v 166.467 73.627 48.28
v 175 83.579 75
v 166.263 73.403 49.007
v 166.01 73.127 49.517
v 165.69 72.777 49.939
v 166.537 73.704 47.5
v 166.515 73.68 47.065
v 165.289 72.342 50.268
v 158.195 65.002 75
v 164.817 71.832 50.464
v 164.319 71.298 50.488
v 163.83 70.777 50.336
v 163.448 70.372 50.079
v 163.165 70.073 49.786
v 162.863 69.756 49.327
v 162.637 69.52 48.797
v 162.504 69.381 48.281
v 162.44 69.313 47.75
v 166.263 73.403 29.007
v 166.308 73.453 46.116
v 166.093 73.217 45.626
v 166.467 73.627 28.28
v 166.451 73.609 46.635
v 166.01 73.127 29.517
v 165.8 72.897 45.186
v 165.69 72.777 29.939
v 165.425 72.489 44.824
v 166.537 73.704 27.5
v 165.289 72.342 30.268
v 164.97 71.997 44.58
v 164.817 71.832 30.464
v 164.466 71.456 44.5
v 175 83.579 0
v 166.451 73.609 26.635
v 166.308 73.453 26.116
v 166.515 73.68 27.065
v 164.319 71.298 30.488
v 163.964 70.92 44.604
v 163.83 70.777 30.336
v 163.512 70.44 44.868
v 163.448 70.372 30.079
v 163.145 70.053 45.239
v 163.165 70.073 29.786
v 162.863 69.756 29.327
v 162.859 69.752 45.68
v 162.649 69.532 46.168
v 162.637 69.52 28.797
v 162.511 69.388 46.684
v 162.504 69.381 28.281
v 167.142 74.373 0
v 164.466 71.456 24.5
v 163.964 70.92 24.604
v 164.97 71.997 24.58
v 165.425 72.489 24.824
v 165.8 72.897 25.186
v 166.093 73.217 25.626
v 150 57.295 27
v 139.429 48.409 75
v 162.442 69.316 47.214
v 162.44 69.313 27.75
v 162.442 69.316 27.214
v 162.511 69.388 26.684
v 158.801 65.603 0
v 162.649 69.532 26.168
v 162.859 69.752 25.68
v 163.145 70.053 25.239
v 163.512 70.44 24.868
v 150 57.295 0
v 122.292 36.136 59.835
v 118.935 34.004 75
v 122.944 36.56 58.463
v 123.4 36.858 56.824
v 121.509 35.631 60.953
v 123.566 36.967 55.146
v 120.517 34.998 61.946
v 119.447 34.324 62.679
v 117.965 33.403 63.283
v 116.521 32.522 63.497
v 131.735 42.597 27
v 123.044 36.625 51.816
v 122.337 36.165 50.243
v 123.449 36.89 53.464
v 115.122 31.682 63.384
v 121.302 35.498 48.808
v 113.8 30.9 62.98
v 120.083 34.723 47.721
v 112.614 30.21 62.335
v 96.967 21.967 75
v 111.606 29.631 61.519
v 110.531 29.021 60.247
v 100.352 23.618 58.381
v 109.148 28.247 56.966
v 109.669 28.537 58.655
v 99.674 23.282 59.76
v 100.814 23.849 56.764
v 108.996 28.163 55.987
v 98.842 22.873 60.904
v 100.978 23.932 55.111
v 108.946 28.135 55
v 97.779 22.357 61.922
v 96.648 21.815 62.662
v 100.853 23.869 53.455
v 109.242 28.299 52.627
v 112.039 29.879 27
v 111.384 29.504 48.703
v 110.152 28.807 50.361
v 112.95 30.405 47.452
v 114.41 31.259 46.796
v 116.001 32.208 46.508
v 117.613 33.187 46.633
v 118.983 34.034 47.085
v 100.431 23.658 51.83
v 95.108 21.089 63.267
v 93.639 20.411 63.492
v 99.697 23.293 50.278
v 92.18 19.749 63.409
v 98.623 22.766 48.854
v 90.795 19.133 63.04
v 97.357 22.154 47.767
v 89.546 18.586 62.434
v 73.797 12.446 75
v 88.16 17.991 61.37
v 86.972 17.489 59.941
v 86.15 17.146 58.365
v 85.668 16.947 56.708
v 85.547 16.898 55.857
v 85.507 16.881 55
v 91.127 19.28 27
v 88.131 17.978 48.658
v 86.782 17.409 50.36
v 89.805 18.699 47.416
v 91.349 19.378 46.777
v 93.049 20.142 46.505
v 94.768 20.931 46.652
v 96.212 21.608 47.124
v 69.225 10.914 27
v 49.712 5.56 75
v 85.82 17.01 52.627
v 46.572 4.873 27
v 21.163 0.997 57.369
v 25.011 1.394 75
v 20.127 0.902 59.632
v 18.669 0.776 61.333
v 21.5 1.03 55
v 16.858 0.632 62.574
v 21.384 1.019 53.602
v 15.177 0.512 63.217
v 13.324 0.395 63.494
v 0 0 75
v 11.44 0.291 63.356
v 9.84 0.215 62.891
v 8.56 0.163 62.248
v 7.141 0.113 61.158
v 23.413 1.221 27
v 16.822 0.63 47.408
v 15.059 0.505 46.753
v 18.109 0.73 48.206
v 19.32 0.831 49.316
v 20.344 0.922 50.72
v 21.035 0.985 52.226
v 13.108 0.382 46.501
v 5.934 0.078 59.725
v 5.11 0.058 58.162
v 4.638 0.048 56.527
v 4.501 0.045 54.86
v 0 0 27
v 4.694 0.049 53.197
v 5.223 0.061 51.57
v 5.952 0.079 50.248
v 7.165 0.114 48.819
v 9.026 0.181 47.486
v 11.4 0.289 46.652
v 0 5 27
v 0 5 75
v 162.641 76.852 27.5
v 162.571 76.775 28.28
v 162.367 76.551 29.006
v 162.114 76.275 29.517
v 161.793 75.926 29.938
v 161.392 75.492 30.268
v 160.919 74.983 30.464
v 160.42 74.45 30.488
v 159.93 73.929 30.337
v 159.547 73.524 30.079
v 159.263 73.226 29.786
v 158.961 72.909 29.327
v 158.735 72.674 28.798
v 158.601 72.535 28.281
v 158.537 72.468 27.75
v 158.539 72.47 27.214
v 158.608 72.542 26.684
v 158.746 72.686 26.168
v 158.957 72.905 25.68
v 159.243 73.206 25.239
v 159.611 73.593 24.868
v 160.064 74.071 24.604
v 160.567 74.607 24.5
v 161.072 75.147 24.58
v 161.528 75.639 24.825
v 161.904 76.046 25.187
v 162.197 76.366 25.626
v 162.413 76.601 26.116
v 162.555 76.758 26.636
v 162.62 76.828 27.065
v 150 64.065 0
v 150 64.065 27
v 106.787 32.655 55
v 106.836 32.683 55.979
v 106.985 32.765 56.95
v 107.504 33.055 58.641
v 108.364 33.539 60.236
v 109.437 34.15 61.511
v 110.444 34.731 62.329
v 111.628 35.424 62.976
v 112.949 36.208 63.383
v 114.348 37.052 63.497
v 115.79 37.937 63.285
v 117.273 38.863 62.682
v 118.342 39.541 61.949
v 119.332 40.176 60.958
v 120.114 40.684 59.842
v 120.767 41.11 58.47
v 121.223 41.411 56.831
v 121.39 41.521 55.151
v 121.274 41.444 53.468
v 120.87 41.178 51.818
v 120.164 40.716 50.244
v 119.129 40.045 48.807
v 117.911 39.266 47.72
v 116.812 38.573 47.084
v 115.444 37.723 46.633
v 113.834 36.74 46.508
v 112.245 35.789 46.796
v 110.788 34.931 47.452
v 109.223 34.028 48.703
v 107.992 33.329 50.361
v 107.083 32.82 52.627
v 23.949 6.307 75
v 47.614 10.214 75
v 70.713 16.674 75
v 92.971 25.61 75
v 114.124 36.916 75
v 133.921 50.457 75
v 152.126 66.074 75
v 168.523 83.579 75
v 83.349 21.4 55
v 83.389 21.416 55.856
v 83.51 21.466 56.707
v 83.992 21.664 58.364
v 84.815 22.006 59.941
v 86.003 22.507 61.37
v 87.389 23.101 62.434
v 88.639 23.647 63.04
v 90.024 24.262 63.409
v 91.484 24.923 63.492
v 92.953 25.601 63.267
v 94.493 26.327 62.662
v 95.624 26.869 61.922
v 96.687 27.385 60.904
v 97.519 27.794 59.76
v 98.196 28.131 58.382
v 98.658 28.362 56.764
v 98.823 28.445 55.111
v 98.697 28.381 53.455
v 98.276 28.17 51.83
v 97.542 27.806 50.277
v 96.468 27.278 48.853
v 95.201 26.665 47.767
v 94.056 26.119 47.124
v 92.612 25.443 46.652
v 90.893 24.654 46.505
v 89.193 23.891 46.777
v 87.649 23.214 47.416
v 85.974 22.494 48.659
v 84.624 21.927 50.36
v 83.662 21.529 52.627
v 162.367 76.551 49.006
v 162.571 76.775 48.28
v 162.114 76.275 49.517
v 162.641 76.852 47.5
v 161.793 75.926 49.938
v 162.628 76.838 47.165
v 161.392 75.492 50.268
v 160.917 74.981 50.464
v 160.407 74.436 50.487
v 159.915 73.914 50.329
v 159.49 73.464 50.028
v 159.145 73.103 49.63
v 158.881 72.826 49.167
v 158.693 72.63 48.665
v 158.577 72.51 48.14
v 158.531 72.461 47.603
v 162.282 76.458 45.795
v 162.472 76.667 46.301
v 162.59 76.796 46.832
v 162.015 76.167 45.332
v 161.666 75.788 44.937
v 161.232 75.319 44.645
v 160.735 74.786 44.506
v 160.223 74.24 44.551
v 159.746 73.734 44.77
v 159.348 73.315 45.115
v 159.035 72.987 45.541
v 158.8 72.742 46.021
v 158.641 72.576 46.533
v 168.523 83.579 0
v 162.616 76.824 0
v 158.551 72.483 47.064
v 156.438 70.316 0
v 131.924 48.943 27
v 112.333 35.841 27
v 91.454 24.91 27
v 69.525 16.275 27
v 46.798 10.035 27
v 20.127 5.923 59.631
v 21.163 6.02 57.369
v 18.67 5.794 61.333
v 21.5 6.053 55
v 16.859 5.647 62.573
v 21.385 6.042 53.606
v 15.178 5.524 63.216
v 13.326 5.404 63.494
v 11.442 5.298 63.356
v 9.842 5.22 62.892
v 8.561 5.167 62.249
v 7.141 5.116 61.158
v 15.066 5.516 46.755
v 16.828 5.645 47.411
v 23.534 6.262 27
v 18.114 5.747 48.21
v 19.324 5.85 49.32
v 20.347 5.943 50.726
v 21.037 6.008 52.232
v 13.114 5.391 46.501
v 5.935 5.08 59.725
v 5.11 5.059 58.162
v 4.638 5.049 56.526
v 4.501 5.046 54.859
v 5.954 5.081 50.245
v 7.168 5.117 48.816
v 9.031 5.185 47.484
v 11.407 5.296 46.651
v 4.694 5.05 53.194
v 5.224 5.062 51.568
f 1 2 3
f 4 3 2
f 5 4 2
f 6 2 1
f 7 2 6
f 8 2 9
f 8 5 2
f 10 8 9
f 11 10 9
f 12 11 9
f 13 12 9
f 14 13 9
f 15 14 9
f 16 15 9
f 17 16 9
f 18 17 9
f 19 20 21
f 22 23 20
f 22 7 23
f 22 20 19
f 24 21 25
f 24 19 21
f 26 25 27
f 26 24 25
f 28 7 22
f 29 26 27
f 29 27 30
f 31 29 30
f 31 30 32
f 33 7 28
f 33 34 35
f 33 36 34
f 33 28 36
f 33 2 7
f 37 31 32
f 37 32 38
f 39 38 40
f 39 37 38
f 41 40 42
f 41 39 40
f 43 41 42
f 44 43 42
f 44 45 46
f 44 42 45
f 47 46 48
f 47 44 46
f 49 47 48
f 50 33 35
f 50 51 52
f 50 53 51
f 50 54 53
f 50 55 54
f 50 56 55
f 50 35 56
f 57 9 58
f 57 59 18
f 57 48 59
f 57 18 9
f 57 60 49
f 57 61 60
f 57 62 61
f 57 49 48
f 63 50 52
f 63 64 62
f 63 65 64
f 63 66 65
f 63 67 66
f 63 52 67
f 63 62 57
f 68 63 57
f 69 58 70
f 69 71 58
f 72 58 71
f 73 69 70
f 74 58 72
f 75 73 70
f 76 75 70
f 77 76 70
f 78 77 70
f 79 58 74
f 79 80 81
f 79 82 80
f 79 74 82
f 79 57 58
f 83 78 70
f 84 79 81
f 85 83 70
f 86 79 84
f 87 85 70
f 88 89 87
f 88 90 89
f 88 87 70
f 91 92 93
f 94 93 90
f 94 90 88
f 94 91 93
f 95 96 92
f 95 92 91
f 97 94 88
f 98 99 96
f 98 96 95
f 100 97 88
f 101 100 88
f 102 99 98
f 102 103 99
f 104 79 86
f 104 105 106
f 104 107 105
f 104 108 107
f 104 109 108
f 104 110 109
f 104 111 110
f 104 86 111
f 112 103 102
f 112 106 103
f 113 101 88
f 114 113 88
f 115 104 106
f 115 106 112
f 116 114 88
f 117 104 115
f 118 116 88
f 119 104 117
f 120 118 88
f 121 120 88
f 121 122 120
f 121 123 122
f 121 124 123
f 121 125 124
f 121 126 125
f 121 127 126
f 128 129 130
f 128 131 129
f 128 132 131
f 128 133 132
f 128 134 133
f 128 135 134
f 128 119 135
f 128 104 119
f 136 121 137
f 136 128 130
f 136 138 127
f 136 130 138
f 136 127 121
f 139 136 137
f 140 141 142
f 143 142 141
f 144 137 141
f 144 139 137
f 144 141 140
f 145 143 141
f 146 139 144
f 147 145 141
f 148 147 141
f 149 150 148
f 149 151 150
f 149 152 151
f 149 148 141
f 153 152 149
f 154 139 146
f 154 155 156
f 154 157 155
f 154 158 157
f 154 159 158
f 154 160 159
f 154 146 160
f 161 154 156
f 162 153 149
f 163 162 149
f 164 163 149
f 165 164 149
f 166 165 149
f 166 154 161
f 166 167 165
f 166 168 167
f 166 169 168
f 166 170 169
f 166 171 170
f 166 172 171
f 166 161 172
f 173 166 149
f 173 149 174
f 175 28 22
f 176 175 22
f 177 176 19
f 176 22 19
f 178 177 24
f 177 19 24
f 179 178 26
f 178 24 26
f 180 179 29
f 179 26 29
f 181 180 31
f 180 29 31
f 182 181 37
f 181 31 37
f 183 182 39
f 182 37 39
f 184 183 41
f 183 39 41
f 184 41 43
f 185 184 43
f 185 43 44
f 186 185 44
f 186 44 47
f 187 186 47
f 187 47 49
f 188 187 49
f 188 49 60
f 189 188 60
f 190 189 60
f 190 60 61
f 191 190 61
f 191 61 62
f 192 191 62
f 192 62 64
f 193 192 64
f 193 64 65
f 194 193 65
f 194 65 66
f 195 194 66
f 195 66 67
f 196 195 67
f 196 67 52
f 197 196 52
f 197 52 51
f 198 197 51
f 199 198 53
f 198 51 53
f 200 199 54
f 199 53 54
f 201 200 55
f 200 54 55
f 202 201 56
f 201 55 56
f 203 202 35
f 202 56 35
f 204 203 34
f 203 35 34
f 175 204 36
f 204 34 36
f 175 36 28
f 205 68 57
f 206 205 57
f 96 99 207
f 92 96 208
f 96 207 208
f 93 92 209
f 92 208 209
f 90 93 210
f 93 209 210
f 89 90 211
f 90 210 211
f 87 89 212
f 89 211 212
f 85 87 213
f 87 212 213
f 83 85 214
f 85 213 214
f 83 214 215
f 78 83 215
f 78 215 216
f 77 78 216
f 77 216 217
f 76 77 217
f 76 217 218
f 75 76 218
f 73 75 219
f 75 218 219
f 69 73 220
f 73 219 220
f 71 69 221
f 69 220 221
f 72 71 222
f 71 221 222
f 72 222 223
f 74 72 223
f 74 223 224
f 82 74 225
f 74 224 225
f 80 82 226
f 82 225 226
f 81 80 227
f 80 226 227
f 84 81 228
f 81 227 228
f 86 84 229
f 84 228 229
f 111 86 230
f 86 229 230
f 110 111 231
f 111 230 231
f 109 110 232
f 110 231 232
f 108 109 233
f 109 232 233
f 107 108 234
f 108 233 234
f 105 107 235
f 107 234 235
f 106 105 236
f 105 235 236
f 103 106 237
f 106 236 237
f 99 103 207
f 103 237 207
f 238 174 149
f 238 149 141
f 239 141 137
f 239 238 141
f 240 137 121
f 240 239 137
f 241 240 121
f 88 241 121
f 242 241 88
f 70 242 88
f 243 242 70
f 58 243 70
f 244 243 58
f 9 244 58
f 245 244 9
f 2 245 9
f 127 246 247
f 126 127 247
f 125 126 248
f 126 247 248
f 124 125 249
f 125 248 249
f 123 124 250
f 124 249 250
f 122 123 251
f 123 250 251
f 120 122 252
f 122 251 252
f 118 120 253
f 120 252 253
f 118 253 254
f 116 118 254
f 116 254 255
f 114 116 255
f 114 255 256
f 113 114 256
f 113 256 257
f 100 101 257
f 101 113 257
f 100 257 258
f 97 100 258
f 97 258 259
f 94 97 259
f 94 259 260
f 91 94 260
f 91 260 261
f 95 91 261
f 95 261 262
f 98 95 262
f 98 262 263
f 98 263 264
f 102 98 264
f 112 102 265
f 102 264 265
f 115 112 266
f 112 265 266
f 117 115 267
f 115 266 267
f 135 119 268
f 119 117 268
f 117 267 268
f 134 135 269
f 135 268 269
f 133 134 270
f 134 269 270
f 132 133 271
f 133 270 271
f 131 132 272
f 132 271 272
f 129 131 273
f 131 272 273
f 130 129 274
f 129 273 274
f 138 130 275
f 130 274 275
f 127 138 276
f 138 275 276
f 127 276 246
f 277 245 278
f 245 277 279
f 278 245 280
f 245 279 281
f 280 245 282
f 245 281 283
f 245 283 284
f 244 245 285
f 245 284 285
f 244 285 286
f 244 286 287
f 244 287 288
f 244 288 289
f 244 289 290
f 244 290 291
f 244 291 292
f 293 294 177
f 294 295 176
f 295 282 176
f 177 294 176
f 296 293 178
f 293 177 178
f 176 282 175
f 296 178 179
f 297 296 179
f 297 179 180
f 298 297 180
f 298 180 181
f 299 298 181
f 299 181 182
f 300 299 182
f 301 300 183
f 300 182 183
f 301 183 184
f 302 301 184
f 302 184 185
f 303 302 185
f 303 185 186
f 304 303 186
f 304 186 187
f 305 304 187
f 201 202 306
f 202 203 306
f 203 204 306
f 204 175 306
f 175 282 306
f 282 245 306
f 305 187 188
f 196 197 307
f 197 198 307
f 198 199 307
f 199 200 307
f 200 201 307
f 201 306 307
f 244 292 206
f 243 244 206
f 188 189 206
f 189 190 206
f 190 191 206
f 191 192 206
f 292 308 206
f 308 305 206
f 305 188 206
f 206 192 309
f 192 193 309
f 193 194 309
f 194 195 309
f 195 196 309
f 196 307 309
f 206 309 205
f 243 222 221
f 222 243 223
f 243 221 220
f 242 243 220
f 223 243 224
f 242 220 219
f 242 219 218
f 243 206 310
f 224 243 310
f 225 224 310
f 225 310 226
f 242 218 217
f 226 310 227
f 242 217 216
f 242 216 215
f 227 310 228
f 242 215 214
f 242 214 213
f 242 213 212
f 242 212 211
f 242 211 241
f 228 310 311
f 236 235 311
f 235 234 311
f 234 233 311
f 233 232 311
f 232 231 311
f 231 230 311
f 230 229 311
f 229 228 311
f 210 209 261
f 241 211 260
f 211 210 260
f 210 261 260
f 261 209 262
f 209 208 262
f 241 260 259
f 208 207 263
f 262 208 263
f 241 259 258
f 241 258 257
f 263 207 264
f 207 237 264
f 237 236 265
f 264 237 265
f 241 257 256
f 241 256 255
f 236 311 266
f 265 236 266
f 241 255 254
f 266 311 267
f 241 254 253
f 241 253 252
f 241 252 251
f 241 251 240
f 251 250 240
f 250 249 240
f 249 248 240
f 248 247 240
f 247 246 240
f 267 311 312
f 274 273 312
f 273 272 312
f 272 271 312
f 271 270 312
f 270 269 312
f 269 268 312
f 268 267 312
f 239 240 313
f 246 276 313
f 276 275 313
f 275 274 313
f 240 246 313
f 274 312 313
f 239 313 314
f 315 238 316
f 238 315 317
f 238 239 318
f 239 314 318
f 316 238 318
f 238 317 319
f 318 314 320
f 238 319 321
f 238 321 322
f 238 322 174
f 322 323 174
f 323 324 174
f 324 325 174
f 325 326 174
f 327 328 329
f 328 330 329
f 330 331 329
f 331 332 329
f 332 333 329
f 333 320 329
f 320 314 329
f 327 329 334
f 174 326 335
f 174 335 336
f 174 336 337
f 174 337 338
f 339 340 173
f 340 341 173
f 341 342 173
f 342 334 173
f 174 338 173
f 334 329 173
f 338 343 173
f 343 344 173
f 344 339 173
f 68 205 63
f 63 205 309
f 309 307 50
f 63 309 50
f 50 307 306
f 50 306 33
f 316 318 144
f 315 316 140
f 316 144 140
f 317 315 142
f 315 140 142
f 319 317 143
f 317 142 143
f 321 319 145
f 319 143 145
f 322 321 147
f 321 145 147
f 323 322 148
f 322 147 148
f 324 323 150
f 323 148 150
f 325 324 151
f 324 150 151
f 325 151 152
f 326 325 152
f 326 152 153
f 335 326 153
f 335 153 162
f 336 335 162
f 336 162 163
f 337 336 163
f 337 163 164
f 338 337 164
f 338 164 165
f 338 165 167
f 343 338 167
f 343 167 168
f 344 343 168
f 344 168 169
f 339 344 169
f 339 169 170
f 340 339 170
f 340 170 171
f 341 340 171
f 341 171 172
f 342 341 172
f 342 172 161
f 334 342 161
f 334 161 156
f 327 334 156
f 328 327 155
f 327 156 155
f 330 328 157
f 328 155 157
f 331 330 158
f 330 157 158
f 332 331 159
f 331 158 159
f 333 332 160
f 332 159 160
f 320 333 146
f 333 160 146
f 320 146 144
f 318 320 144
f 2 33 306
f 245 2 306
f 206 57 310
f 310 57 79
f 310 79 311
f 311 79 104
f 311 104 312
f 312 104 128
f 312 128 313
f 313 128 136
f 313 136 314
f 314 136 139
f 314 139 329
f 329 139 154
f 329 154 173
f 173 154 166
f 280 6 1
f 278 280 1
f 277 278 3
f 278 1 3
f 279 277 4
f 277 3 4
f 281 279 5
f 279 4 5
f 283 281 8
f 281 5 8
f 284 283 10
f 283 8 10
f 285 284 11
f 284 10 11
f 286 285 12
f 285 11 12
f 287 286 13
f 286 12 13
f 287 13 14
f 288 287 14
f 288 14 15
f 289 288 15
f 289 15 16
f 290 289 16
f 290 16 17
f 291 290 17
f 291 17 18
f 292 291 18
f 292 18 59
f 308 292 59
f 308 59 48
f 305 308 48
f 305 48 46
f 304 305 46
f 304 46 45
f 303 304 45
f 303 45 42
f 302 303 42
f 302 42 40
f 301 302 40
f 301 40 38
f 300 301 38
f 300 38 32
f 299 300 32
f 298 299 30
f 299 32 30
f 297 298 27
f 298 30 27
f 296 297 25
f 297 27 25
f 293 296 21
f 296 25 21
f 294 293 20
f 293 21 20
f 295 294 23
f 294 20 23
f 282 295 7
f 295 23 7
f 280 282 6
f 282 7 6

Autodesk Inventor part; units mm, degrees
sketch "Sketch1" plane through (0, 0, 0) normal (0, 0, 1) x (1, 0, 0)
  circle A0 centre (0, 225) radius 225 construction
  circle A1 centre (0, 225) radius 220 construction
  arc A2 (0, 0) -> (175, 83.5786) centre (0, 225) ccw
  line L0 (175, 83.5786) -> (168.523, 83.5786)
  line L1 (0, 0) -> (0, 5)
  arc A3 (0, 5) -> (168.523, 83.5786) centre (0, 225) ccw
  dimension "d0" = 450
  dimension "d1" = 5
  dimension "d2" = 175
extrude "Extrusion1" add sketch "Sketch1" along normal blind 75
ref_plane "Work Plane1" through (0, 0, 0) normal (0, -1, 0) x (1, 0, 0)
sketch "Sketch2" plane through (0, 0, 0) normal (0, -1, 0) x (1, 0, 0)
  line L0 (0, 0) -> (150, 0)
  line L1 (150, 0) -> (150, 27)
  line L2 (150, 27) -> (0, 27)
  line L3 (0, 27) -> (0, 0)
  line L4 (0, 0) -> (175, 0) projected
  line L5 (175, 0) -> (175, 75) projected
  line L6 (0, 75) -> (175, 75) projected
  line L7 (0, 0) -> (0, 75) projected
  dimension "d5" = 27
  dimension "d6" = 25
extrude "Extrusion2" cut sketch "Sketch2" against normal through all contours L3 L2 L1 L0
ref_plane "Work Plane2" through (175, 83.5786, 0) normal (0.7778, -0.6285, 0) x (0.6285, 0.7778, 0)
sketch "Sketch3" plane through (175, 83.5786, 0) normal (0.7778, -0.6285, 0) x (0.6285, 0.7778, 0)
  circle A0 centre (-16, 47.5) radius 3
  circle A1 centre (-16, 27.5) radius 3
  line L0 (0, 0) -> (0, 75) projected
  line L1 (-36.1564, 27) -> (-36.1564, 0) projected
  line L2 (-36.1564, 0) -> (0, 0) projected
  line L3 (0, 0) -> (0, 75) projected
  line L4 (-175, 75) -> (0, 75) projected
  line L5 (-175, 27) -> (-175, 75) projected
  line L6 (-175, 27) -> (-36.1564, 27) projected
  point P0 (-175, 0)
  dimension "d9" = 6
  dimension "d10" = 6
  dimension "d11" = 16
  dimension "d12" = 27.5
  dimension "d13" = 20
extrude "Extrusion3" cut sketch "Sketch3" against normal through all contours A0 | A1
sketch "Sketch4" plane through (0, 0, 0) normal (0, -1, 0) x (1, 0, 0)
  circle A0 centre (13, 55) radius 8.5
  line L0 (0, 27) -> (0, 75) projected
  line L1 (175, 75) -> (0, 75) projected
  point P0 (0, 0)
  dimension "d16" = 17
  dimension "d17" = 13
  dimension "d18" = 20
extrude "Extrusion4" cut sketch "Sketch4" along normal through all both and the other way through all
ref_plane "Work Plane3" through (175, 83.5786, 75) normal (0.431, -0.9024, 0) x (-0.9024, -0.431, 0)
sketch "Sketch6" plane through (175, 83.5786, 75) normal (0.431, -0.9024, 0) x (-0.9024, -0.431, 0)
  circle A0 centre (101, 20) radius 8.5
  circle A1 centre (75, 20) radius 8.5
  line L0 (191.7792, 0) -> (5.8446, 0) projected
  point P0 (193.934, 75)
  point P1 (0, 0)
  dimension "d26" = 17
  dimension "d27" = 17
  dimension "d28" = 26
  dimension "d29" = 20
  dimension "d30" = 75
extrude "Extrusion5" cut sketch "Sketch6" along normal through all
properties part number "CW007" material "ABS Plastic"
